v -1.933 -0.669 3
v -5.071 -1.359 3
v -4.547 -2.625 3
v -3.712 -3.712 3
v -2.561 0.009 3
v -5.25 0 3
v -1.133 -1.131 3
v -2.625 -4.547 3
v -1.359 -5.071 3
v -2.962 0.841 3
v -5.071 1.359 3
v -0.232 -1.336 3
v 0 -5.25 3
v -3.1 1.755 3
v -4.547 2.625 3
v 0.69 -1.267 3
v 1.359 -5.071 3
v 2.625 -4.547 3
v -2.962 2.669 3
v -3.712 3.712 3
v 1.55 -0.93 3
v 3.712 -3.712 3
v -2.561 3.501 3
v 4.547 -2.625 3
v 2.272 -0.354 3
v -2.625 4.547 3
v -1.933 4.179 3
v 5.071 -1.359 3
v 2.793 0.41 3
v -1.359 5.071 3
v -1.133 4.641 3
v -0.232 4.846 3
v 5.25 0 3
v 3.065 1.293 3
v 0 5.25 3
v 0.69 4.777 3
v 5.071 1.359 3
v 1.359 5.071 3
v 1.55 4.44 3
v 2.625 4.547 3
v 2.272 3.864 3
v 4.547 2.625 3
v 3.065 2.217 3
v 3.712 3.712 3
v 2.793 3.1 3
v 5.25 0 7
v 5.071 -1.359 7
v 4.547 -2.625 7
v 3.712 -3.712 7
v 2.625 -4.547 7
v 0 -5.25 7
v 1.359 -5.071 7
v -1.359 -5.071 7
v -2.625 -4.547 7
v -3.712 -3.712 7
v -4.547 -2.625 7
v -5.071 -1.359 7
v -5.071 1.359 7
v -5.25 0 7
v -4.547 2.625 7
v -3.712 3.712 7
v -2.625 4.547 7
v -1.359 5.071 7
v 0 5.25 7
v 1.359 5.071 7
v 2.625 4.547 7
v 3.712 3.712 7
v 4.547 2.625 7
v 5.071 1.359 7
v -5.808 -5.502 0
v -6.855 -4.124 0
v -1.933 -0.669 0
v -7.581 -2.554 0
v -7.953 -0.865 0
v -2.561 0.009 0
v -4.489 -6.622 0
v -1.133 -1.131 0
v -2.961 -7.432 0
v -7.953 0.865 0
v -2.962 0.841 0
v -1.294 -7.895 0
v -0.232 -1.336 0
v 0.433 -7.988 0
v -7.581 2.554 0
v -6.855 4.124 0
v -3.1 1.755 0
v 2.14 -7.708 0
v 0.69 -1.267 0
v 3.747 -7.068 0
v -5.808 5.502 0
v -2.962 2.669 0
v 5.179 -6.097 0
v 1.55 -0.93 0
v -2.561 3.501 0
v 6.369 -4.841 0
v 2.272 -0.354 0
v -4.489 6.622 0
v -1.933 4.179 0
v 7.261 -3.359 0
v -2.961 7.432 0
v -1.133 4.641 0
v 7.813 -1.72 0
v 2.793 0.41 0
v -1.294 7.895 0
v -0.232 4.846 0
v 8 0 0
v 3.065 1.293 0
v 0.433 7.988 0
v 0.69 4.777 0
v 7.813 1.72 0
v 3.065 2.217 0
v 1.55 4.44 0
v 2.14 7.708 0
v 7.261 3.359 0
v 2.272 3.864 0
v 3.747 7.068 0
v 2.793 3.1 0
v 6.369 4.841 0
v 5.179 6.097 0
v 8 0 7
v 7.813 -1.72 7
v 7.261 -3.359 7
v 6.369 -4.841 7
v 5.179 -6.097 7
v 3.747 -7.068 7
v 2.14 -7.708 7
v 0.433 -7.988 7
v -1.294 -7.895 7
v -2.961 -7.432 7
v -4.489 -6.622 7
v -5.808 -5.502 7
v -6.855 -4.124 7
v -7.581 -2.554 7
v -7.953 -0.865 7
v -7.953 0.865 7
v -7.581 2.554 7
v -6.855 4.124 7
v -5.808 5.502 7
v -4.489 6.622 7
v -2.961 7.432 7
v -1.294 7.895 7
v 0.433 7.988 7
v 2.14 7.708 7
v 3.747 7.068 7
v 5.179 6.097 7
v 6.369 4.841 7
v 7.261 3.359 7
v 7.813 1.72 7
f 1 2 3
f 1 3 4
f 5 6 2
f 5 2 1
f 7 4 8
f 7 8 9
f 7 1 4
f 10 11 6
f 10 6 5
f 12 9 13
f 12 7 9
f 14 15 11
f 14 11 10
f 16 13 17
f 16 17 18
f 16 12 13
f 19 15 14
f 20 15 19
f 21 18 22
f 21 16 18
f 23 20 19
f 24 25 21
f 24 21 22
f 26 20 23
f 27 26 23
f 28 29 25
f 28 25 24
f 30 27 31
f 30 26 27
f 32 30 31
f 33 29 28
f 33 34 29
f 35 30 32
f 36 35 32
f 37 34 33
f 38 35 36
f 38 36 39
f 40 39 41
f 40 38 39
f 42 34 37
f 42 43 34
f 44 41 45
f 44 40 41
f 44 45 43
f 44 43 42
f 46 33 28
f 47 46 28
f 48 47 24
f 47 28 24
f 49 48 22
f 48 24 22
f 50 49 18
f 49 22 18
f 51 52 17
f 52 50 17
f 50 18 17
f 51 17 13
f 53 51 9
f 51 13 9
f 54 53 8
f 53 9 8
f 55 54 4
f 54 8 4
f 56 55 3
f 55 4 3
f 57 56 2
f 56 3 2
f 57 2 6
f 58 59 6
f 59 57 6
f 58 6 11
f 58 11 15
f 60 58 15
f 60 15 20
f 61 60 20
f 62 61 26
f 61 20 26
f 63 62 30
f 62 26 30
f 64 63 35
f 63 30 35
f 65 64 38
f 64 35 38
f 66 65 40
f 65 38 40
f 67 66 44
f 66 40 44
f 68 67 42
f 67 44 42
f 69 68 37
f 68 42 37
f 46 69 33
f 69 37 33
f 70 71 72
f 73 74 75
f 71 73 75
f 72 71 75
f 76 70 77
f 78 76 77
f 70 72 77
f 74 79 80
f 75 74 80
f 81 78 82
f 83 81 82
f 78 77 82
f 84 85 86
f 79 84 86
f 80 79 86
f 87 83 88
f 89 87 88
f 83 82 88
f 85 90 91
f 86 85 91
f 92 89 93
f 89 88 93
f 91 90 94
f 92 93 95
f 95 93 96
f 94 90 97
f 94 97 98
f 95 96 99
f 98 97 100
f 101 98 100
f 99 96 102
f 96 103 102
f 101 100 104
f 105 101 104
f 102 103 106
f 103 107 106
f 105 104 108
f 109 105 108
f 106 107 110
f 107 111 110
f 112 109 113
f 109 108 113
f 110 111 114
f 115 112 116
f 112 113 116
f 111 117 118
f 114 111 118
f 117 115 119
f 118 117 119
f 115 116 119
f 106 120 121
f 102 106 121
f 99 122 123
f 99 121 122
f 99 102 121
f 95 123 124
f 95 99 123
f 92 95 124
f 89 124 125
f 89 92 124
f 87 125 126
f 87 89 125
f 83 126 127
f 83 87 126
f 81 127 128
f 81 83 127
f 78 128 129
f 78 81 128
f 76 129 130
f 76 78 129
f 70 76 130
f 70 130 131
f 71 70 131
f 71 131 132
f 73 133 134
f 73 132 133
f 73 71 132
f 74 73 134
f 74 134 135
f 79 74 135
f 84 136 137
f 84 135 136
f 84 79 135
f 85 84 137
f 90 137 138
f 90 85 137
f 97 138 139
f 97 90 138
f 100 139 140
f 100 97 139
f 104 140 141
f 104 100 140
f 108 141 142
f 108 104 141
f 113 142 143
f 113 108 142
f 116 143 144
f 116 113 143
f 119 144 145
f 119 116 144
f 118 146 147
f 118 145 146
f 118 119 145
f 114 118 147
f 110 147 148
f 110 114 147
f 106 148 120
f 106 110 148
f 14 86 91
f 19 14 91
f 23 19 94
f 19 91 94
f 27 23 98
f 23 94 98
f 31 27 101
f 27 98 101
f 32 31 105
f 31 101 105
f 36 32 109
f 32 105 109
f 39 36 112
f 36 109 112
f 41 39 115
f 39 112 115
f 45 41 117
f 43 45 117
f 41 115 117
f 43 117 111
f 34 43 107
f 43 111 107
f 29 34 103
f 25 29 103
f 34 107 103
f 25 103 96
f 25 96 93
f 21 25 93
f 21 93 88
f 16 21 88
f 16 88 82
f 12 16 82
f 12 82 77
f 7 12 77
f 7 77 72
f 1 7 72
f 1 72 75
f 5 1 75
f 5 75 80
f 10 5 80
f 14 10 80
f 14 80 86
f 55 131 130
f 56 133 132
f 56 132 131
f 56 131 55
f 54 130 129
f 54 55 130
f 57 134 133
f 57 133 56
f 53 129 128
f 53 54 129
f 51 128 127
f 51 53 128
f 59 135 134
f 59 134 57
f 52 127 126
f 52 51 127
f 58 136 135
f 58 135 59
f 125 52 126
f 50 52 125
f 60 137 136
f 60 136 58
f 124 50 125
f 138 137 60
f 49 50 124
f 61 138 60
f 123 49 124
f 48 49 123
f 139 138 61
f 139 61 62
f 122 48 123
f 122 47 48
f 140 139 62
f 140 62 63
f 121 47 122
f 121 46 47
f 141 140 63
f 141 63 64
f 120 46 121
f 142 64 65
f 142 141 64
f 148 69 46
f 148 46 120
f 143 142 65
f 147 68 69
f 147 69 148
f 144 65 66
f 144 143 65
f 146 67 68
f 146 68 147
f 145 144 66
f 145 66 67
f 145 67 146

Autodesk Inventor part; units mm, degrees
ref_plane "YZ Plane" through (0, 0, 0) normal (1, 0, 0) x (0, 1, 0)
ref_plane "XZ Plane" through (0, 0, 0) normal (0, 1, 0) x (-1, 0, 0)
ref_plane "XY Plane" through (0, 0, 0) normal (0, 0, 1) x (1, 0, 0)
sketch "Sketch1" plane through (0, 0, 0) normal (0, 0, 1) x (1, 0, 0)
  circle A0 centre (0, 0) radius 5.85 construction
  circle A1 centre (0, 0) radius 2.95 construction
  circle A2 centre (0, 0) radius 3.1
  circle A3 centre (0, 0) radius 8
  dimension "d0" = 11.7
  dimension "d1" = 5.9
  dimension "d2" = 6.2
  dimension "d3" = 16
extrude "Extrusion1" add sketch "Sketch1" along normal blind 3 contours A2 | A3
sketch "Sketch2" plane through (0, 0, 3) normal (0, 0, 1) x (1, 0, 0)
  circle A0 centre (0, 0) radius 4.935 construction
  circle A1 centre (0, 0) radius 2.95 construction
  circle A2 centre (0, 0) radius 8 projected
  circle A3 centre (0, 0) radius 5.25
  dimension "d6" = 9.87
  dimension "d7" = 5.9
  dimension "d10" = 10.5
extrude "Extrusion2" add sketch "Sketch2" along normal blind 4
sketch "Sketch3" plane through (0, 0, 0) normal (0, 0, -1) x (-1, 0, 0)
  circle A0 centre (0, 0) radius 8 construction
  circle A1 centre (0, 1.755) radius 3.1
  circle A2 centre (0, 0) radius 8 construction
  line L0 (0, -11.2) -> (0, 11.2) construction
  circle A3 centre (0, -2.095) radius 1.5 construction
  circle A4 centre (0, 1.755) radius 1.5 construction
  circle A5 centre (0, 0) radius 4.855 construction
  dimension "d13" = 6.2
  dimension "d14" = 3
  dimension "d15" = 3
  dimension "d16" = 3.85
  dimension "d21" = 9.71
  dimension "d22" = 1.6
extrude "Extrusion3" cut sketch "Sketch3" against normal through all
properties part number "30_raspi_lens_to_laser"
